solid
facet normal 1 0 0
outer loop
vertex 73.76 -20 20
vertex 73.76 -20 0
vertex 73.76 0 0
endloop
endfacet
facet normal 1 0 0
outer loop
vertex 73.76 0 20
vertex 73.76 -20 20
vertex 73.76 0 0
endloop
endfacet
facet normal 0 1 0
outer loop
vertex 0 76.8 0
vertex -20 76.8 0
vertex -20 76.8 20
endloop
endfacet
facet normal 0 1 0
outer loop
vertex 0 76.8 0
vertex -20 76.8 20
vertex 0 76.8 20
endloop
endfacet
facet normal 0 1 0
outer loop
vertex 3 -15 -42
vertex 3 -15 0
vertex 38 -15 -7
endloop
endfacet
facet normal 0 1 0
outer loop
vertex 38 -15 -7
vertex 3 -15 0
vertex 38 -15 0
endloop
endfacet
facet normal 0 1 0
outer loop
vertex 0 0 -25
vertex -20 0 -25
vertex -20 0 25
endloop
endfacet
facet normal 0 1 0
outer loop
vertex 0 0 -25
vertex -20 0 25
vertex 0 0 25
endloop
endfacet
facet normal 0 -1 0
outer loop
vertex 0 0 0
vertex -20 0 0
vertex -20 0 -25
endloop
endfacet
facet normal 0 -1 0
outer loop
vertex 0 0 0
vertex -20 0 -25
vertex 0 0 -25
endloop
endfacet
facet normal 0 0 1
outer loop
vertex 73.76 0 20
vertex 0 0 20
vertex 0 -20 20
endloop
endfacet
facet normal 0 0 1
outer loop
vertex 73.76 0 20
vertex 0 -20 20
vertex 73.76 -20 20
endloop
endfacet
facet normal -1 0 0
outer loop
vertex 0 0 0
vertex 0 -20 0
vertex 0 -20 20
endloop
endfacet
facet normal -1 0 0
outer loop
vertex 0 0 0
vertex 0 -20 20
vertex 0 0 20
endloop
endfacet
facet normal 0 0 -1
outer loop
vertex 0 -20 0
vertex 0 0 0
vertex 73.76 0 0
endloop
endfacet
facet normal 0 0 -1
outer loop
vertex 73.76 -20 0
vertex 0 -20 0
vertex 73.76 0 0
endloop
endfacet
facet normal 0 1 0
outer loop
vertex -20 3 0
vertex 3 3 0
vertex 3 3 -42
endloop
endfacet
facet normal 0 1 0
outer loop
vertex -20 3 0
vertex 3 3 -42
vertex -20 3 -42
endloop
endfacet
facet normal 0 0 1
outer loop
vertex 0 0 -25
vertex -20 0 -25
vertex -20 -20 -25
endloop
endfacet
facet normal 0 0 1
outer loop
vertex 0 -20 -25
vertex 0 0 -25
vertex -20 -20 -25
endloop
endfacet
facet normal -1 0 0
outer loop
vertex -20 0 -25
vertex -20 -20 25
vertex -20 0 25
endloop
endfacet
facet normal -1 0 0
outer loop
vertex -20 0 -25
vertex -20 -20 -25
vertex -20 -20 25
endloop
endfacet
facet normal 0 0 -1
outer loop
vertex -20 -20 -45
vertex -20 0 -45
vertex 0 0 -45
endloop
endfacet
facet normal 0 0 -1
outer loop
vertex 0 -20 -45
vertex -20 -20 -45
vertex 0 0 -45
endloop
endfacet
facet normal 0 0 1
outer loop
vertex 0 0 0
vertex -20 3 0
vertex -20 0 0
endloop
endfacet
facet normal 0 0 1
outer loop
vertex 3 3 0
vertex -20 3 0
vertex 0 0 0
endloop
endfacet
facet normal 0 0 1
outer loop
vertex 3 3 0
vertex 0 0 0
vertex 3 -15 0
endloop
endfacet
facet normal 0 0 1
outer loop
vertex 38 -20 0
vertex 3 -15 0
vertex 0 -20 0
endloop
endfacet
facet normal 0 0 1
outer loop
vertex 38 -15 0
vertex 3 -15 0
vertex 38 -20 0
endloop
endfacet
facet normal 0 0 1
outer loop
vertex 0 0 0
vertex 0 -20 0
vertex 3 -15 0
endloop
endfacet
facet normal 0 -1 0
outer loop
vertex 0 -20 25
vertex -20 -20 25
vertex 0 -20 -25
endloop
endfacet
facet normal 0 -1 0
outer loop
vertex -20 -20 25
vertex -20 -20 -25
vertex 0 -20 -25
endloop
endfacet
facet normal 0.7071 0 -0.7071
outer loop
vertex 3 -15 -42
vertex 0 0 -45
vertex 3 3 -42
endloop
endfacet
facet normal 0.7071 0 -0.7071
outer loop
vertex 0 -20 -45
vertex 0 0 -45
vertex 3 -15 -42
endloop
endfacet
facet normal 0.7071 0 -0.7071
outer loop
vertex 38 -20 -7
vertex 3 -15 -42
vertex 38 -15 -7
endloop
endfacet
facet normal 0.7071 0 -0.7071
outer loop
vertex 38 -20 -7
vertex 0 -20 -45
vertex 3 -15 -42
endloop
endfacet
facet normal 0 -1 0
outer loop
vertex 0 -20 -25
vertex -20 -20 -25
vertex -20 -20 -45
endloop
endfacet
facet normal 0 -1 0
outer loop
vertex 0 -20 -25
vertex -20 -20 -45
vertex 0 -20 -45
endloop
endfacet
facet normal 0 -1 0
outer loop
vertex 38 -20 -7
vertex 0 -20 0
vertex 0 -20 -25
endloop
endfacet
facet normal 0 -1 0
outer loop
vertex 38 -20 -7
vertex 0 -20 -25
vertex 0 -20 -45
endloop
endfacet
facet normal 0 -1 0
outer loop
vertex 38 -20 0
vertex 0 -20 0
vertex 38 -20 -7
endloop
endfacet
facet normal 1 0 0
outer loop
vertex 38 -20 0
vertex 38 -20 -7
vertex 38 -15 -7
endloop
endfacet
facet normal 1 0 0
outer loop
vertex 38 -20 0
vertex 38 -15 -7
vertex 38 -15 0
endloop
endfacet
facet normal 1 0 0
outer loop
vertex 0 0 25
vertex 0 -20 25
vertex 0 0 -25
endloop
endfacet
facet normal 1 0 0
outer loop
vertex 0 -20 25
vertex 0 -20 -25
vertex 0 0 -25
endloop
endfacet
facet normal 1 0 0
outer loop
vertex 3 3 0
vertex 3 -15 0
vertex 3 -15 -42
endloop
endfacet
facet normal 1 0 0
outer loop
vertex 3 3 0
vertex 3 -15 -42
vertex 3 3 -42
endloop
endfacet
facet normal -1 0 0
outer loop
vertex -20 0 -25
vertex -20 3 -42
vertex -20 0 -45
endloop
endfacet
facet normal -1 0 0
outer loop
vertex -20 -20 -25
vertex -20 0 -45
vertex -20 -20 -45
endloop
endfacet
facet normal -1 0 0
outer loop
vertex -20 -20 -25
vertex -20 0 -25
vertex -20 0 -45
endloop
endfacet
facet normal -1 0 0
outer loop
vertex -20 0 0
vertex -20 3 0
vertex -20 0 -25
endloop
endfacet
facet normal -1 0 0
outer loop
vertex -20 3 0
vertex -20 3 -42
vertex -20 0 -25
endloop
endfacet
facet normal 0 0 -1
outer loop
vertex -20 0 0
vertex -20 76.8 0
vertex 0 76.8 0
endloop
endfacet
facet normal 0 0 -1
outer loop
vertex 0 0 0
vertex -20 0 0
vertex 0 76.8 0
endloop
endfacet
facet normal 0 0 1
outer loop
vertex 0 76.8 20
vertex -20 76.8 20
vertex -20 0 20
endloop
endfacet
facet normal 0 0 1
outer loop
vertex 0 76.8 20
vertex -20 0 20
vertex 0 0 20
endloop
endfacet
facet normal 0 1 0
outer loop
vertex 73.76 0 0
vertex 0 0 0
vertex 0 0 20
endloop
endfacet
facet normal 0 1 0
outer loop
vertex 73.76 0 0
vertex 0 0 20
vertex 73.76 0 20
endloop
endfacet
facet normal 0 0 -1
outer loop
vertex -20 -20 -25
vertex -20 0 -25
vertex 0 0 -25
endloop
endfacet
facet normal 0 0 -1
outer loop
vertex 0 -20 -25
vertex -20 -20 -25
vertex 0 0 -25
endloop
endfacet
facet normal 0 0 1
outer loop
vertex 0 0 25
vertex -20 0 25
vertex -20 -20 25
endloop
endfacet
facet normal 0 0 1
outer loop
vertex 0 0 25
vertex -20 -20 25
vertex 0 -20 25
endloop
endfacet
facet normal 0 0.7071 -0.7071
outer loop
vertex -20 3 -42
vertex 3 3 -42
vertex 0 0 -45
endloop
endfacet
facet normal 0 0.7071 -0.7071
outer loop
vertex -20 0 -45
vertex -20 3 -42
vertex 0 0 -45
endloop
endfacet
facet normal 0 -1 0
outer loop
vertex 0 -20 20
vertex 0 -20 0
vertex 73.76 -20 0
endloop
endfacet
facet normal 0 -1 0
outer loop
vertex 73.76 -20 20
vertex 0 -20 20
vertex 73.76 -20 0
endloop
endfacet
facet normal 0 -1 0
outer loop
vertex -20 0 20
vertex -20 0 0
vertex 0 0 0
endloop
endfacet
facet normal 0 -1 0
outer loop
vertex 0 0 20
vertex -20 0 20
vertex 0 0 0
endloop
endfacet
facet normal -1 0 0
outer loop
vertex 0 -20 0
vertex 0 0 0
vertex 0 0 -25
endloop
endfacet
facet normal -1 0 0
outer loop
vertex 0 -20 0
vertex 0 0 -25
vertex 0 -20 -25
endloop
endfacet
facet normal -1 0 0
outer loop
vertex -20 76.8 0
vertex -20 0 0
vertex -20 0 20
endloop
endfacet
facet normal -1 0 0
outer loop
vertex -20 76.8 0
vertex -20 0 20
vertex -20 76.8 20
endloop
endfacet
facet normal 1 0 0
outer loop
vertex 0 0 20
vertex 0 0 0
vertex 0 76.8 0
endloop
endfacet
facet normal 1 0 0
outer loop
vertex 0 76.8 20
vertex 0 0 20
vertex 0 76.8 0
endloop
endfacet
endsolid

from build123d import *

# Parameters (mm, degrees)
F0_W          = 20
F0_H          = 76.8000064468
F1_DEPTH      = 20
F0_W_2        = 73.7599998636
F0_H_2        = 20
F2_DEPTH      = 25
F2_DEPTH_BACK = 25
F3_W          = 20
F3_H          = 20
F4_DEPTH      = 20
F5_DEPTH      = 5
F7_DEPTH      = 5
F9_DEPTH      = 45
F10_DEPTH     = 25
F11_DEPTH     = 25
F12_DEPTH     = 25


with BuildPart() as f1:
    # F0 (on Top) → F1 (new body)
    with BuildSketch(Plane.XY):
        with Locations((-10, 38.4000032234)):
            Rectangle(F0_W, F0_H)
    extrude(amount=F1_DEPTH)


with BuildPart() as f1b:
    # F0 (on Top) → F1, piece 2 (new body)
    with BuildSketch(Plane.XY):
        with Locations((36.8799999318, -10)):
            Rectangle(F0_W_2, F0_H_2)
    extrude(amount=F1_DEPTH)


with BuildPart() as f2:
    # F0 (on Top) → F2 (new body, two sides)
    with BuildSketch(Plane.XY) as f2_sk:
        with Locations((-10, -10)):
            Rectangle(F0_W, F0_H_2)
    extrude(amount=-F2_DEPTH)
    extrude(f2_sk.sketch, amount=F2_DEPTH_BACK)


with BuildPart() as f4:
    # F3 (on face) → F4 (new body)
    with BuildSketch(Plane(origin=(-20, 0, 0), x_dir=(0, -1, 0), z_dir=(-1, 0, 0))):
        with Locations((10, -35)):
            Rectangle(F3_W, F3_H)
    extrude(amount=-F4_DEPTH)

    # F3 (on face) → F5 (join)
    with BuildSketch(Plane(origin=(-20, 0, 0), x_dir=(0, -1, 0), z_dir=(-1, 0, 0))):
        Polygon((0, -45), (0, -25), (0, 0), (-38, 0), (-38, -7), align=None)
    extrude(amount=-F5_DEPTH)

    # F6 (on face) → F7 (join)
    with BuildSketch(Plane.XZ.offset(20)):
        Polygon((0, -25), (0, -45), (38, -7), (38, 0), (0, 0), align=None)
    extrude(amount=-F7_DEPTH)

    # F8 (on Top) → F9 (join)
    with BuildSketch(Plane.XY):
        Polygon((3, 3), (-15, 3), (-15, 0), (0, 0), (0, -15), (3, -15), align=None)
    extrude(amount=-F9_DEPTH)

    # F10 (cut): a face of the model
    f10_faces = [f4.faces().sort_by_distance(p)[0] for p in [
        (-15, 2, -44),
    ]]
    extrude(f10_faces, amount=-F10_DEPTH, mode=Mode.SUBTRACT)

    # F11 (cut): a face of the model
    f11_faces = [f4.faces().sort_by_distance(p)[0] for p in [
        (2, -15, -44),
    ]]
    extrude(f11_faces, amount=-F11_DEPTH, mode=Mode.SUBTRACT)

    # F12 (cut): a face of the model
    f12_faces = [f4.faces().sort_by_distance(p)[0] for p in [
        (-15, 16.3333333333, -14.3333333333),
    ]]
    extrude(f12_faces, amount=-F12_DEPTH, mode=Mode.SUBTRACT)


solid = Compound([f1.part, f1b.part, f2.part, f4.part])
